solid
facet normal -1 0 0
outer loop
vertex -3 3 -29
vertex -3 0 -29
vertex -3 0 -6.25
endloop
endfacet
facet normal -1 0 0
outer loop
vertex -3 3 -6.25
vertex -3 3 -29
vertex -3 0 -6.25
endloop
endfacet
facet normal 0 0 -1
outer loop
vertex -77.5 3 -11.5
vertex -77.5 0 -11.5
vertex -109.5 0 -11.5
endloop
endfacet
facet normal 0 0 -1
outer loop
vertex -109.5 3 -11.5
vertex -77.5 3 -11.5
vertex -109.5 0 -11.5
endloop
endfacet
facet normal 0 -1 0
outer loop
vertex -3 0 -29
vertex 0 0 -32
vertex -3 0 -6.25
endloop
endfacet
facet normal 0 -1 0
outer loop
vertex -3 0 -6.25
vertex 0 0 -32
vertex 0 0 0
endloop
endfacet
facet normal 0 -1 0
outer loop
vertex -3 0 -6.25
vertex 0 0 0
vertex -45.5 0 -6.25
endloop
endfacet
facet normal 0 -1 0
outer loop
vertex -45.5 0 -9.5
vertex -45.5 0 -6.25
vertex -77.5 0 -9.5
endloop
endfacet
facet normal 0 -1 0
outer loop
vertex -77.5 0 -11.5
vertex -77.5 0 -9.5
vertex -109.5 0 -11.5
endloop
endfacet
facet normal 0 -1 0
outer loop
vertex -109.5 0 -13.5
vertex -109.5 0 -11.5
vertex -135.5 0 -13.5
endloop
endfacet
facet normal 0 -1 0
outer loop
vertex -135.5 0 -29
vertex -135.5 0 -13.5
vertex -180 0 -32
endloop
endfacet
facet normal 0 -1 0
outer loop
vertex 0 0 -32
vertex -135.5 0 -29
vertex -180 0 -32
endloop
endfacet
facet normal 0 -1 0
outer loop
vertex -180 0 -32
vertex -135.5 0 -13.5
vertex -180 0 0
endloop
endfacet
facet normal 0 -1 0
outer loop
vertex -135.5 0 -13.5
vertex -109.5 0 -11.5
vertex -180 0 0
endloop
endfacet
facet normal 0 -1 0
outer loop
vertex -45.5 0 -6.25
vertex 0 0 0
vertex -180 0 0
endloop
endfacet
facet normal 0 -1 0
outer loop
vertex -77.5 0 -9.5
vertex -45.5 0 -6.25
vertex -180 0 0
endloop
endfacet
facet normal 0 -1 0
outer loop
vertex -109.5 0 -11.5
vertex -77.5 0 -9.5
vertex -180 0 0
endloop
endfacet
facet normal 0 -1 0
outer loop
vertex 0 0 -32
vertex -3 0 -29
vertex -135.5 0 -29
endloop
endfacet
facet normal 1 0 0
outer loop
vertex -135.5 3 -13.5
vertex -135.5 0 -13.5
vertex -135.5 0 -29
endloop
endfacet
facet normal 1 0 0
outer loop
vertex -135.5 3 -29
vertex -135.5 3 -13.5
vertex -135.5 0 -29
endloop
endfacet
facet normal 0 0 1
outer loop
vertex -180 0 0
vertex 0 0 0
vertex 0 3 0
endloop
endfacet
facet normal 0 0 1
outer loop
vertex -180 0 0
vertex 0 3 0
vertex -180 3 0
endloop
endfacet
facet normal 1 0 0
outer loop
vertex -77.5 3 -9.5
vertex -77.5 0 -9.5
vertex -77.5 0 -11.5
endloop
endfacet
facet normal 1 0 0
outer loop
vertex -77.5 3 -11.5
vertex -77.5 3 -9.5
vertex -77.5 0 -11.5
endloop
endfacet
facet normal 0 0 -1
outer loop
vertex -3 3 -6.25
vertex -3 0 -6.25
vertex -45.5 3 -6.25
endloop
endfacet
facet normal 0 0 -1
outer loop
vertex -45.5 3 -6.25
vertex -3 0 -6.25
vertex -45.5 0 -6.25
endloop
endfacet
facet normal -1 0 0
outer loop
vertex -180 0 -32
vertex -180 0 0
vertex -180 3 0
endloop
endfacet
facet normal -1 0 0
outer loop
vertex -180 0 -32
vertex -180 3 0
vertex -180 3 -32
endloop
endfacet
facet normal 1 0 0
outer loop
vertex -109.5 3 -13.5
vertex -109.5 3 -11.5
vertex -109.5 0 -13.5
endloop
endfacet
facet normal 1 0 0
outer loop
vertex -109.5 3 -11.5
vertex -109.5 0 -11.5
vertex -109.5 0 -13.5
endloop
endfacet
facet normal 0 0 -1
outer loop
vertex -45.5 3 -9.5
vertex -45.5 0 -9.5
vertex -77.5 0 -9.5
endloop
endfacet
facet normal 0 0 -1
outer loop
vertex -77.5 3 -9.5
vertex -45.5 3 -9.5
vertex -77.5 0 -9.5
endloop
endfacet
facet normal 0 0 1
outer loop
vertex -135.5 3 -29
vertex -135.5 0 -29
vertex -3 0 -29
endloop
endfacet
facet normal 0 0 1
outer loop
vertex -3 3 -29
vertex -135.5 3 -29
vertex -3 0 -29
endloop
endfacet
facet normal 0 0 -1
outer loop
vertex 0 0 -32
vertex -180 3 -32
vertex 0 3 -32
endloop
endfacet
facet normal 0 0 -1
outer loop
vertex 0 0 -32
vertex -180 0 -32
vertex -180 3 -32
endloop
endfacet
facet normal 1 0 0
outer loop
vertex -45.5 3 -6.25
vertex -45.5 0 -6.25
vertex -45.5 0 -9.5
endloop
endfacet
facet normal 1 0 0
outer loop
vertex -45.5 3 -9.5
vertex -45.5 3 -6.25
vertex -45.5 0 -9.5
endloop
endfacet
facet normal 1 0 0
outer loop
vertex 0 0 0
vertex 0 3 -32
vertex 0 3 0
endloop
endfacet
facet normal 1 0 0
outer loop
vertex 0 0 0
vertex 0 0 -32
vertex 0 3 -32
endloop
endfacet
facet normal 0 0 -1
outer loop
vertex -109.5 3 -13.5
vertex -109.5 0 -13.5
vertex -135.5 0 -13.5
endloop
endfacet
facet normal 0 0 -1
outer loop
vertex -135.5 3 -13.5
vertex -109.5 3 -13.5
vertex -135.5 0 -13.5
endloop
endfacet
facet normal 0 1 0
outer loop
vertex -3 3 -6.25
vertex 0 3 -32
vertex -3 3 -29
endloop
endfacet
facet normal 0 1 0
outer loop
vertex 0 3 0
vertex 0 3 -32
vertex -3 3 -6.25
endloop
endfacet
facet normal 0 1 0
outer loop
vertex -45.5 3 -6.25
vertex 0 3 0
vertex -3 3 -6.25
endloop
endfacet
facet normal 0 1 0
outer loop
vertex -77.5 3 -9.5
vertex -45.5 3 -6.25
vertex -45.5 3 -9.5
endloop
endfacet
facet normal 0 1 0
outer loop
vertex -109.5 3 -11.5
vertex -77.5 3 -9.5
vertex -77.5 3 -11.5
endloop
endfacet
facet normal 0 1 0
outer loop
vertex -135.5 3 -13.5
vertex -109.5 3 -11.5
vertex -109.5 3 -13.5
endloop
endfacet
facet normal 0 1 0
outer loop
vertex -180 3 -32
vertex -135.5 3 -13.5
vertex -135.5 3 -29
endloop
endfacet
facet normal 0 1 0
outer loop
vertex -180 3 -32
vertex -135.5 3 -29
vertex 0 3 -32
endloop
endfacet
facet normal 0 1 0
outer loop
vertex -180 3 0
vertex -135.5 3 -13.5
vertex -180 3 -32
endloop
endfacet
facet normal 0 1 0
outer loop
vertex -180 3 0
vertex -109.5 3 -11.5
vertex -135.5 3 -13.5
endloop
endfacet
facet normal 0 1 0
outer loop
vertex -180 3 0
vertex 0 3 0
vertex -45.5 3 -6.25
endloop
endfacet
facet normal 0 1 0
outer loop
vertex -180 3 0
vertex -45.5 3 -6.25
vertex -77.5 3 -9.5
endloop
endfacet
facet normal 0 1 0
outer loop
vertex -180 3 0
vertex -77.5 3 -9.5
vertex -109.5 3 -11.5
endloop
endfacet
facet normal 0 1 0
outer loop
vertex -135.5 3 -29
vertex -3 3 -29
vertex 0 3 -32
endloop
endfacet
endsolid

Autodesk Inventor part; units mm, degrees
ref_plane "YZ Plane" through (0, 0, 0) normal (1, 0, 0) x (0, 1, 0)
ref_plane "XZ Plane" through (0, 0, 0) normal (0, 1, 0) x (-1, 0, 0)
ref_plane "XY Plane" through (0, 0, 0) normal (0, 0, 1) x (1, 0, 0)
sketch "Sketch1" plane through (0, 0, 0) normal (0, 1, 0) x (-1, 0, 0)
  line L0 (0, 0) -> (180, 0)
  line L1 (180, 0) -> (180, -32)
  line L2 (180, -32) -> (0, -32)
  line L3 (0, -32) -> (0, 0)
  line L4 (0, -32) -> (180, -32)
  line L5 (180, -32) -> (180, -29)
  line L6 (180, -29) -> (0, -29)
  line L7 (0, -29) -> (0, -32)
  line L8 (0, -32) -> (3, -32)
  line L9 (3, -32) -> (3, 0)
  line L10 (3, 0) -> (0, 0)
  line L11 (0, 0) -> (0, -32)
  line L12 (135.5, -29) -> (109.5, -29)
  line L13 (109.5, -29) -> (109.5, -13.5)
  line L14 (109.5, -13.5) -> (135.5, -13.5)
  line L15 (135.5, -13.5) -> (135.5, -29)
  line L16 (109.5, -29) -> (77.5, -29)
  line L17 (77.5, -29) -> (77.5, -11.5)
  line L18 (77.5, -11.5) -> (109.5, -11.5)
  line L19 (109.5, -11.5) -> (109.5, -29)
  line L20 (77.5, -29) -> (45.5, -29)
  line L21 (45.5, -29) -> (45.5, -9.5)
  line L22 (45.5, -9.5) -> (77.5, -9.5)
  line L23 (77.5, -9.5) -> (77.5, -29)
  line L24 (45.5, -29) -> (3, -29)
  line L25 (3, -29) -> (3, -6.25)
  line L26 (3, -6.25) -> (45.5, -6.25)
  line L27 (45.5, -6.25) -> (45.5, -29)
  point P0 (3, -29)
  point P1 (0, -29)
  dimension "d0" = 180
  dimension "d1" = 32
  dimension "d2" = 3
  dimension "d3" = 3
  dimension "d4" = 26
  dimension "d5" = 42.5
  dimension "d6" = 32
  dimension "d7" = 32
  dimension "d14" = 18.5
  dimension "d16" = 20.5
  dimension "d17" = 22.5
  dimension "d18" = 25.75
extrude "Extrusion1" add sketch "Sketch1" along normal blind 3 contours L0 L9 L6 L3 | L0 L1 L6 L15 L14 L19 L18 L23 L22 L27 L26 L9 | L6 L9 L2 L3 | L6 L1 L2 L9
properties part number "sledPlate" material "Polycarbonate, Smoke"
